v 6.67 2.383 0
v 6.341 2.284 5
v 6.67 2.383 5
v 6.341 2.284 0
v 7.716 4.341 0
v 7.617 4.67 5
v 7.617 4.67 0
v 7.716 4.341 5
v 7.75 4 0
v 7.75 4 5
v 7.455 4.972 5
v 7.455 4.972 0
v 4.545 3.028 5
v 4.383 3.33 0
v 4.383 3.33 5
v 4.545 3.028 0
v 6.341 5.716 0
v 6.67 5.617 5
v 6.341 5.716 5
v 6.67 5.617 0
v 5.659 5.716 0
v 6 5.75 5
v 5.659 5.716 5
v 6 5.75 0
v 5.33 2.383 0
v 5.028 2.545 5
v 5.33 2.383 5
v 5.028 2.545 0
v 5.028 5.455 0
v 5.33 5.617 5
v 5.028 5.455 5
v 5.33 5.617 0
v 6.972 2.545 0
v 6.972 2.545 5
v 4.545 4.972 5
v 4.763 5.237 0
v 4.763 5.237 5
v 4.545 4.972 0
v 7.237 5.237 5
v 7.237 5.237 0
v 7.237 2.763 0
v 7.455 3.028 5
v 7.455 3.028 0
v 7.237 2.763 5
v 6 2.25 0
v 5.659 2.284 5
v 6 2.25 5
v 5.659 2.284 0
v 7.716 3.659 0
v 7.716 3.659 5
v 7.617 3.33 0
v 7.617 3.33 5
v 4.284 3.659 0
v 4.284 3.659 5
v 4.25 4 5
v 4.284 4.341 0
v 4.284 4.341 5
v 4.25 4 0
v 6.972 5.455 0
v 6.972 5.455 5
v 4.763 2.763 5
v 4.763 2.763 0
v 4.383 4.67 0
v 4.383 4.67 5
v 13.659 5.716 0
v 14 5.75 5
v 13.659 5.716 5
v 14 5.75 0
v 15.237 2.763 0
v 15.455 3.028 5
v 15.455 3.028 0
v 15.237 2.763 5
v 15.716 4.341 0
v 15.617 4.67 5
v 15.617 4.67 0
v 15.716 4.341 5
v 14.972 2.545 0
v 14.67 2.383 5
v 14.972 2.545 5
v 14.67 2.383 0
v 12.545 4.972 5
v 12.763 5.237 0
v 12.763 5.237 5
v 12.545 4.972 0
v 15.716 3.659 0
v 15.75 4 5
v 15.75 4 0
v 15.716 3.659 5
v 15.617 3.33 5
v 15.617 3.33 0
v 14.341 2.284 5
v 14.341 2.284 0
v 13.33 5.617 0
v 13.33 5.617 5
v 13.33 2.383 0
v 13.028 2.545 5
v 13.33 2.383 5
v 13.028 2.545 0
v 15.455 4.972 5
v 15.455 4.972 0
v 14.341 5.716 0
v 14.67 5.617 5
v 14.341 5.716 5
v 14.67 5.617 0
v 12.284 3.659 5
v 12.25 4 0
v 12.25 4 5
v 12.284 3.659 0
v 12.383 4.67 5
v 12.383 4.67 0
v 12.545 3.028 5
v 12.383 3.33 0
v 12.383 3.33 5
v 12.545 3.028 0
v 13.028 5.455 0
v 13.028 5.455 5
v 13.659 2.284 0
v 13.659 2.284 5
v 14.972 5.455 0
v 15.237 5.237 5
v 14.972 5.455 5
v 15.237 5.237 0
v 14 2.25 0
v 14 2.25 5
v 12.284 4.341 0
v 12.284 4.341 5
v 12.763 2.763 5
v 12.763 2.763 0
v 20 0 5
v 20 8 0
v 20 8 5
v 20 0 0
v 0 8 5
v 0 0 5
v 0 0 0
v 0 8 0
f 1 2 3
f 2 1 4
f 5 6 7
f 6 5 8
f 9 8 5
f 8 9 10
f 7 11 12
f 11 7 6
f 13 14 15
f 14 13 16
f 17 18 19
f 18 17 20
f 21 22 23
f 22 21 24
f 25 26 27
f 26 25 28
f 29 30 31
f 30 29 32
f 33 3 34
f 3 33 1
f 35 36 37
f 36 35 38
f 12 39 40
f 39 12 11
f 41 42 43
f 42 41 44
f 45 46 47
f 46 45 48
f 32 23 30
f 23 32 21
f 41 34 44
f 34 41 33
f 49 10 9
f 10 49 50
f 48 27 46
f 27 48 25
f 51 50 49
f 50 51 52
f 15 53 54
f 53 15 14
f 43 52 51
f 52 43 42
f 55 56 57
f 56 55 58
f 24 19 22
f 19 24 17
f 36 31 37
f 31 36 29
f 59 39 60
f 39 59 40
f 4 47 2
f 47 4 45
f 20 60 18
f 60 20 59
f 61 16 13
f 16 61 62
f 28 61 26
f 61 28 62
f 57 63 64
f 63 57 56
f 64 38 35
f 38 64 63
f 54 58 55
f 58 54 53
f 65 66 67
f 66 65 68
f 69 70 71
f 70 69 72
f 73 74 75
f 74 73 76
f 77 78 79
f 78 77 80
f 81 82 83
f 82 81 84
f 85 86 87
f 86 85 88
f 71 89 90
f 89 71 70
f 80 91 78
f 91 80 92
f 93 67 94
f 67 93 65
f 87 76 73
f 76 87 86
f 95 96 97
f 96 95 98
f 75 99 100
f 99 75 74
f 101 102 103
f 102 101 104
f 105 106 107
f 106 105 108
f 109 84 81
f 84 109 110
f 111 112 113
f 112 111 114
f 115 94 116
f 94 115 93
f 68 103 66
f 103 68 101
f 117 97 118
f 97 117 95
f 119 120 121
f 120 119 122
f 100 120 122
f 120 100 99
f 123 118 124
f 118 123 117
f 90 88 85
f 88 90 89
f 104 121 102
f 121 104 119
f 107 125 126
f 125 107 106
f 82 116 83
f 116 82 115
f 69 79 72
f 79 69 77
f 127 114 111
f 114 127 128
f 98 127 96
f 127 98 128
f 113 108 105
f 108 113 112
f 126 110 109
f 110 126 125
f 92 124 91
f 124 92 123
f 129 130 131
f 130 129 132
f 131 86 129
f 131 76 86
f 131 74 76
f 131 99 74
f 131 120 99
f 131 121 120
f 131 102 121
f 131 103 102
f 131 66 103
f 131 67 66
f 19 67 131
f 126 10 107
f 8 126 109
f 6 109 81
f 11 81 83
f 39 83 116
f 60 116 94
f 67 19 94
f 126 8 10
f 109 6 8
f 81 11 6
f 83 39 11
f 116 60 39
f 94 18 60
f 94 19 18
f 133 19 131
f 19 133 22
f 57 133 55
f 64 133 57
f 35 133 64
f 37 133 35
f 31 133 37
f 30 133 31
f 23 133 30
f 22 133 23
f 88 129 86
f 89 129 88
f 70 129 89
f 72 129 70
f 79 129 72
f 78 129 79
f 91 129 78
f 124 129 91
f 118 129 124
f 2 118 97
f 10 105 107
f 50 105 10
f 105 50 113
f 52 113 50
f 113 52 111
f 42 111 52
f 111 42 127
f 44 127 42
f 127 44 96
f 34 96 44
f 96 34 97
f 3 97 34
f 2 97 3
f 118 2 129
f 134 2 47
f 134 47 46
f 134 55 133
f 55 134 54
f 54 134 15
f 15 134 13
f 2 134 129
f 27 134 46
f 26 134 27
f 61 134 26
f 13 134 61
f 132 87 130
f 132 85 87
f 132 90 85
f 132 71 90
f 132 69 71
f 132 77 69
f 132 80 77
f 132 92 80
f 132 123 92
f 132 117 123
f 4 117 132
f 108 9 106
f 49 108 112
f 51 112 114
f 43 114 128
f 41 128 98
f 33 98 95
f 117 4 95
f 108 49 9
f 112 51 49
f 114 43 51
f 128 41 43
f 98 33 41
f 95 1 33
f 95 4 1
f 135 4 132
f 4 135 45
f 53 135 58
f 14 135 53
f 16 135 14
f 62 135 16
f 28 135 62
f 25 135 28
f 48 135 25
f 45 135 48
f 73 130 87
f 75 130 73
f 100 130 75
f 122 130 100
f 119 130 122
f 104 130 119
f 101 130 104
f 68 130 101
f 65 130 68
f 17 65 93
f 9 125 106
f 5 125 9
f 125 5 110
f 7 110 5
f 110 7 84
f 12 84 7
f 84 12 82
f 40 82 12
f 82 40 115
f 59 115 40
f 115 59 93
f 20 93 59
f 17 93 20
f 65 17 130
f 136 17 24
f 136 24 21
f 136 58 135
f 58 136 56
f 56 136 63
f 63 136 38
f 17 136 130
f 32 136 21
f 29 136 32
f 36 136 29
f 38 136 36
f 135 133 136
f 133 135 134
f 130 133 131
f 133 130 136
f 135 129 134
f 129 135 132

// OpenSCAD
$fn = 32;

// ----------------------------------------------------------------------
// Micro pad: two-hole pad, 5-20 mm class
// ----------------------------------------------------------------------

// --- parameters (mm) ---
pad_l = 20;               // pad length, X
pad_w = 8;                // pad width, Y
pad_t = 5;                // pad thickness, Z
hole_d = 3.5;             // hole diameter
hole_x = 6;               // X of the first hole centre
fit_tol = 0.02;           // tolerance for press fits, mm
free_tol = 0.2;           // tolerance for clearance fits, mm

difference() {
  cube([pad_l, pad_w, pad_t]);
  for (x = [hole_x, pad_l - hole_x])
    translate([x, pad_w / 2, -1])
      cylinder(h = pad_t + 2, d = hole_d);
}
